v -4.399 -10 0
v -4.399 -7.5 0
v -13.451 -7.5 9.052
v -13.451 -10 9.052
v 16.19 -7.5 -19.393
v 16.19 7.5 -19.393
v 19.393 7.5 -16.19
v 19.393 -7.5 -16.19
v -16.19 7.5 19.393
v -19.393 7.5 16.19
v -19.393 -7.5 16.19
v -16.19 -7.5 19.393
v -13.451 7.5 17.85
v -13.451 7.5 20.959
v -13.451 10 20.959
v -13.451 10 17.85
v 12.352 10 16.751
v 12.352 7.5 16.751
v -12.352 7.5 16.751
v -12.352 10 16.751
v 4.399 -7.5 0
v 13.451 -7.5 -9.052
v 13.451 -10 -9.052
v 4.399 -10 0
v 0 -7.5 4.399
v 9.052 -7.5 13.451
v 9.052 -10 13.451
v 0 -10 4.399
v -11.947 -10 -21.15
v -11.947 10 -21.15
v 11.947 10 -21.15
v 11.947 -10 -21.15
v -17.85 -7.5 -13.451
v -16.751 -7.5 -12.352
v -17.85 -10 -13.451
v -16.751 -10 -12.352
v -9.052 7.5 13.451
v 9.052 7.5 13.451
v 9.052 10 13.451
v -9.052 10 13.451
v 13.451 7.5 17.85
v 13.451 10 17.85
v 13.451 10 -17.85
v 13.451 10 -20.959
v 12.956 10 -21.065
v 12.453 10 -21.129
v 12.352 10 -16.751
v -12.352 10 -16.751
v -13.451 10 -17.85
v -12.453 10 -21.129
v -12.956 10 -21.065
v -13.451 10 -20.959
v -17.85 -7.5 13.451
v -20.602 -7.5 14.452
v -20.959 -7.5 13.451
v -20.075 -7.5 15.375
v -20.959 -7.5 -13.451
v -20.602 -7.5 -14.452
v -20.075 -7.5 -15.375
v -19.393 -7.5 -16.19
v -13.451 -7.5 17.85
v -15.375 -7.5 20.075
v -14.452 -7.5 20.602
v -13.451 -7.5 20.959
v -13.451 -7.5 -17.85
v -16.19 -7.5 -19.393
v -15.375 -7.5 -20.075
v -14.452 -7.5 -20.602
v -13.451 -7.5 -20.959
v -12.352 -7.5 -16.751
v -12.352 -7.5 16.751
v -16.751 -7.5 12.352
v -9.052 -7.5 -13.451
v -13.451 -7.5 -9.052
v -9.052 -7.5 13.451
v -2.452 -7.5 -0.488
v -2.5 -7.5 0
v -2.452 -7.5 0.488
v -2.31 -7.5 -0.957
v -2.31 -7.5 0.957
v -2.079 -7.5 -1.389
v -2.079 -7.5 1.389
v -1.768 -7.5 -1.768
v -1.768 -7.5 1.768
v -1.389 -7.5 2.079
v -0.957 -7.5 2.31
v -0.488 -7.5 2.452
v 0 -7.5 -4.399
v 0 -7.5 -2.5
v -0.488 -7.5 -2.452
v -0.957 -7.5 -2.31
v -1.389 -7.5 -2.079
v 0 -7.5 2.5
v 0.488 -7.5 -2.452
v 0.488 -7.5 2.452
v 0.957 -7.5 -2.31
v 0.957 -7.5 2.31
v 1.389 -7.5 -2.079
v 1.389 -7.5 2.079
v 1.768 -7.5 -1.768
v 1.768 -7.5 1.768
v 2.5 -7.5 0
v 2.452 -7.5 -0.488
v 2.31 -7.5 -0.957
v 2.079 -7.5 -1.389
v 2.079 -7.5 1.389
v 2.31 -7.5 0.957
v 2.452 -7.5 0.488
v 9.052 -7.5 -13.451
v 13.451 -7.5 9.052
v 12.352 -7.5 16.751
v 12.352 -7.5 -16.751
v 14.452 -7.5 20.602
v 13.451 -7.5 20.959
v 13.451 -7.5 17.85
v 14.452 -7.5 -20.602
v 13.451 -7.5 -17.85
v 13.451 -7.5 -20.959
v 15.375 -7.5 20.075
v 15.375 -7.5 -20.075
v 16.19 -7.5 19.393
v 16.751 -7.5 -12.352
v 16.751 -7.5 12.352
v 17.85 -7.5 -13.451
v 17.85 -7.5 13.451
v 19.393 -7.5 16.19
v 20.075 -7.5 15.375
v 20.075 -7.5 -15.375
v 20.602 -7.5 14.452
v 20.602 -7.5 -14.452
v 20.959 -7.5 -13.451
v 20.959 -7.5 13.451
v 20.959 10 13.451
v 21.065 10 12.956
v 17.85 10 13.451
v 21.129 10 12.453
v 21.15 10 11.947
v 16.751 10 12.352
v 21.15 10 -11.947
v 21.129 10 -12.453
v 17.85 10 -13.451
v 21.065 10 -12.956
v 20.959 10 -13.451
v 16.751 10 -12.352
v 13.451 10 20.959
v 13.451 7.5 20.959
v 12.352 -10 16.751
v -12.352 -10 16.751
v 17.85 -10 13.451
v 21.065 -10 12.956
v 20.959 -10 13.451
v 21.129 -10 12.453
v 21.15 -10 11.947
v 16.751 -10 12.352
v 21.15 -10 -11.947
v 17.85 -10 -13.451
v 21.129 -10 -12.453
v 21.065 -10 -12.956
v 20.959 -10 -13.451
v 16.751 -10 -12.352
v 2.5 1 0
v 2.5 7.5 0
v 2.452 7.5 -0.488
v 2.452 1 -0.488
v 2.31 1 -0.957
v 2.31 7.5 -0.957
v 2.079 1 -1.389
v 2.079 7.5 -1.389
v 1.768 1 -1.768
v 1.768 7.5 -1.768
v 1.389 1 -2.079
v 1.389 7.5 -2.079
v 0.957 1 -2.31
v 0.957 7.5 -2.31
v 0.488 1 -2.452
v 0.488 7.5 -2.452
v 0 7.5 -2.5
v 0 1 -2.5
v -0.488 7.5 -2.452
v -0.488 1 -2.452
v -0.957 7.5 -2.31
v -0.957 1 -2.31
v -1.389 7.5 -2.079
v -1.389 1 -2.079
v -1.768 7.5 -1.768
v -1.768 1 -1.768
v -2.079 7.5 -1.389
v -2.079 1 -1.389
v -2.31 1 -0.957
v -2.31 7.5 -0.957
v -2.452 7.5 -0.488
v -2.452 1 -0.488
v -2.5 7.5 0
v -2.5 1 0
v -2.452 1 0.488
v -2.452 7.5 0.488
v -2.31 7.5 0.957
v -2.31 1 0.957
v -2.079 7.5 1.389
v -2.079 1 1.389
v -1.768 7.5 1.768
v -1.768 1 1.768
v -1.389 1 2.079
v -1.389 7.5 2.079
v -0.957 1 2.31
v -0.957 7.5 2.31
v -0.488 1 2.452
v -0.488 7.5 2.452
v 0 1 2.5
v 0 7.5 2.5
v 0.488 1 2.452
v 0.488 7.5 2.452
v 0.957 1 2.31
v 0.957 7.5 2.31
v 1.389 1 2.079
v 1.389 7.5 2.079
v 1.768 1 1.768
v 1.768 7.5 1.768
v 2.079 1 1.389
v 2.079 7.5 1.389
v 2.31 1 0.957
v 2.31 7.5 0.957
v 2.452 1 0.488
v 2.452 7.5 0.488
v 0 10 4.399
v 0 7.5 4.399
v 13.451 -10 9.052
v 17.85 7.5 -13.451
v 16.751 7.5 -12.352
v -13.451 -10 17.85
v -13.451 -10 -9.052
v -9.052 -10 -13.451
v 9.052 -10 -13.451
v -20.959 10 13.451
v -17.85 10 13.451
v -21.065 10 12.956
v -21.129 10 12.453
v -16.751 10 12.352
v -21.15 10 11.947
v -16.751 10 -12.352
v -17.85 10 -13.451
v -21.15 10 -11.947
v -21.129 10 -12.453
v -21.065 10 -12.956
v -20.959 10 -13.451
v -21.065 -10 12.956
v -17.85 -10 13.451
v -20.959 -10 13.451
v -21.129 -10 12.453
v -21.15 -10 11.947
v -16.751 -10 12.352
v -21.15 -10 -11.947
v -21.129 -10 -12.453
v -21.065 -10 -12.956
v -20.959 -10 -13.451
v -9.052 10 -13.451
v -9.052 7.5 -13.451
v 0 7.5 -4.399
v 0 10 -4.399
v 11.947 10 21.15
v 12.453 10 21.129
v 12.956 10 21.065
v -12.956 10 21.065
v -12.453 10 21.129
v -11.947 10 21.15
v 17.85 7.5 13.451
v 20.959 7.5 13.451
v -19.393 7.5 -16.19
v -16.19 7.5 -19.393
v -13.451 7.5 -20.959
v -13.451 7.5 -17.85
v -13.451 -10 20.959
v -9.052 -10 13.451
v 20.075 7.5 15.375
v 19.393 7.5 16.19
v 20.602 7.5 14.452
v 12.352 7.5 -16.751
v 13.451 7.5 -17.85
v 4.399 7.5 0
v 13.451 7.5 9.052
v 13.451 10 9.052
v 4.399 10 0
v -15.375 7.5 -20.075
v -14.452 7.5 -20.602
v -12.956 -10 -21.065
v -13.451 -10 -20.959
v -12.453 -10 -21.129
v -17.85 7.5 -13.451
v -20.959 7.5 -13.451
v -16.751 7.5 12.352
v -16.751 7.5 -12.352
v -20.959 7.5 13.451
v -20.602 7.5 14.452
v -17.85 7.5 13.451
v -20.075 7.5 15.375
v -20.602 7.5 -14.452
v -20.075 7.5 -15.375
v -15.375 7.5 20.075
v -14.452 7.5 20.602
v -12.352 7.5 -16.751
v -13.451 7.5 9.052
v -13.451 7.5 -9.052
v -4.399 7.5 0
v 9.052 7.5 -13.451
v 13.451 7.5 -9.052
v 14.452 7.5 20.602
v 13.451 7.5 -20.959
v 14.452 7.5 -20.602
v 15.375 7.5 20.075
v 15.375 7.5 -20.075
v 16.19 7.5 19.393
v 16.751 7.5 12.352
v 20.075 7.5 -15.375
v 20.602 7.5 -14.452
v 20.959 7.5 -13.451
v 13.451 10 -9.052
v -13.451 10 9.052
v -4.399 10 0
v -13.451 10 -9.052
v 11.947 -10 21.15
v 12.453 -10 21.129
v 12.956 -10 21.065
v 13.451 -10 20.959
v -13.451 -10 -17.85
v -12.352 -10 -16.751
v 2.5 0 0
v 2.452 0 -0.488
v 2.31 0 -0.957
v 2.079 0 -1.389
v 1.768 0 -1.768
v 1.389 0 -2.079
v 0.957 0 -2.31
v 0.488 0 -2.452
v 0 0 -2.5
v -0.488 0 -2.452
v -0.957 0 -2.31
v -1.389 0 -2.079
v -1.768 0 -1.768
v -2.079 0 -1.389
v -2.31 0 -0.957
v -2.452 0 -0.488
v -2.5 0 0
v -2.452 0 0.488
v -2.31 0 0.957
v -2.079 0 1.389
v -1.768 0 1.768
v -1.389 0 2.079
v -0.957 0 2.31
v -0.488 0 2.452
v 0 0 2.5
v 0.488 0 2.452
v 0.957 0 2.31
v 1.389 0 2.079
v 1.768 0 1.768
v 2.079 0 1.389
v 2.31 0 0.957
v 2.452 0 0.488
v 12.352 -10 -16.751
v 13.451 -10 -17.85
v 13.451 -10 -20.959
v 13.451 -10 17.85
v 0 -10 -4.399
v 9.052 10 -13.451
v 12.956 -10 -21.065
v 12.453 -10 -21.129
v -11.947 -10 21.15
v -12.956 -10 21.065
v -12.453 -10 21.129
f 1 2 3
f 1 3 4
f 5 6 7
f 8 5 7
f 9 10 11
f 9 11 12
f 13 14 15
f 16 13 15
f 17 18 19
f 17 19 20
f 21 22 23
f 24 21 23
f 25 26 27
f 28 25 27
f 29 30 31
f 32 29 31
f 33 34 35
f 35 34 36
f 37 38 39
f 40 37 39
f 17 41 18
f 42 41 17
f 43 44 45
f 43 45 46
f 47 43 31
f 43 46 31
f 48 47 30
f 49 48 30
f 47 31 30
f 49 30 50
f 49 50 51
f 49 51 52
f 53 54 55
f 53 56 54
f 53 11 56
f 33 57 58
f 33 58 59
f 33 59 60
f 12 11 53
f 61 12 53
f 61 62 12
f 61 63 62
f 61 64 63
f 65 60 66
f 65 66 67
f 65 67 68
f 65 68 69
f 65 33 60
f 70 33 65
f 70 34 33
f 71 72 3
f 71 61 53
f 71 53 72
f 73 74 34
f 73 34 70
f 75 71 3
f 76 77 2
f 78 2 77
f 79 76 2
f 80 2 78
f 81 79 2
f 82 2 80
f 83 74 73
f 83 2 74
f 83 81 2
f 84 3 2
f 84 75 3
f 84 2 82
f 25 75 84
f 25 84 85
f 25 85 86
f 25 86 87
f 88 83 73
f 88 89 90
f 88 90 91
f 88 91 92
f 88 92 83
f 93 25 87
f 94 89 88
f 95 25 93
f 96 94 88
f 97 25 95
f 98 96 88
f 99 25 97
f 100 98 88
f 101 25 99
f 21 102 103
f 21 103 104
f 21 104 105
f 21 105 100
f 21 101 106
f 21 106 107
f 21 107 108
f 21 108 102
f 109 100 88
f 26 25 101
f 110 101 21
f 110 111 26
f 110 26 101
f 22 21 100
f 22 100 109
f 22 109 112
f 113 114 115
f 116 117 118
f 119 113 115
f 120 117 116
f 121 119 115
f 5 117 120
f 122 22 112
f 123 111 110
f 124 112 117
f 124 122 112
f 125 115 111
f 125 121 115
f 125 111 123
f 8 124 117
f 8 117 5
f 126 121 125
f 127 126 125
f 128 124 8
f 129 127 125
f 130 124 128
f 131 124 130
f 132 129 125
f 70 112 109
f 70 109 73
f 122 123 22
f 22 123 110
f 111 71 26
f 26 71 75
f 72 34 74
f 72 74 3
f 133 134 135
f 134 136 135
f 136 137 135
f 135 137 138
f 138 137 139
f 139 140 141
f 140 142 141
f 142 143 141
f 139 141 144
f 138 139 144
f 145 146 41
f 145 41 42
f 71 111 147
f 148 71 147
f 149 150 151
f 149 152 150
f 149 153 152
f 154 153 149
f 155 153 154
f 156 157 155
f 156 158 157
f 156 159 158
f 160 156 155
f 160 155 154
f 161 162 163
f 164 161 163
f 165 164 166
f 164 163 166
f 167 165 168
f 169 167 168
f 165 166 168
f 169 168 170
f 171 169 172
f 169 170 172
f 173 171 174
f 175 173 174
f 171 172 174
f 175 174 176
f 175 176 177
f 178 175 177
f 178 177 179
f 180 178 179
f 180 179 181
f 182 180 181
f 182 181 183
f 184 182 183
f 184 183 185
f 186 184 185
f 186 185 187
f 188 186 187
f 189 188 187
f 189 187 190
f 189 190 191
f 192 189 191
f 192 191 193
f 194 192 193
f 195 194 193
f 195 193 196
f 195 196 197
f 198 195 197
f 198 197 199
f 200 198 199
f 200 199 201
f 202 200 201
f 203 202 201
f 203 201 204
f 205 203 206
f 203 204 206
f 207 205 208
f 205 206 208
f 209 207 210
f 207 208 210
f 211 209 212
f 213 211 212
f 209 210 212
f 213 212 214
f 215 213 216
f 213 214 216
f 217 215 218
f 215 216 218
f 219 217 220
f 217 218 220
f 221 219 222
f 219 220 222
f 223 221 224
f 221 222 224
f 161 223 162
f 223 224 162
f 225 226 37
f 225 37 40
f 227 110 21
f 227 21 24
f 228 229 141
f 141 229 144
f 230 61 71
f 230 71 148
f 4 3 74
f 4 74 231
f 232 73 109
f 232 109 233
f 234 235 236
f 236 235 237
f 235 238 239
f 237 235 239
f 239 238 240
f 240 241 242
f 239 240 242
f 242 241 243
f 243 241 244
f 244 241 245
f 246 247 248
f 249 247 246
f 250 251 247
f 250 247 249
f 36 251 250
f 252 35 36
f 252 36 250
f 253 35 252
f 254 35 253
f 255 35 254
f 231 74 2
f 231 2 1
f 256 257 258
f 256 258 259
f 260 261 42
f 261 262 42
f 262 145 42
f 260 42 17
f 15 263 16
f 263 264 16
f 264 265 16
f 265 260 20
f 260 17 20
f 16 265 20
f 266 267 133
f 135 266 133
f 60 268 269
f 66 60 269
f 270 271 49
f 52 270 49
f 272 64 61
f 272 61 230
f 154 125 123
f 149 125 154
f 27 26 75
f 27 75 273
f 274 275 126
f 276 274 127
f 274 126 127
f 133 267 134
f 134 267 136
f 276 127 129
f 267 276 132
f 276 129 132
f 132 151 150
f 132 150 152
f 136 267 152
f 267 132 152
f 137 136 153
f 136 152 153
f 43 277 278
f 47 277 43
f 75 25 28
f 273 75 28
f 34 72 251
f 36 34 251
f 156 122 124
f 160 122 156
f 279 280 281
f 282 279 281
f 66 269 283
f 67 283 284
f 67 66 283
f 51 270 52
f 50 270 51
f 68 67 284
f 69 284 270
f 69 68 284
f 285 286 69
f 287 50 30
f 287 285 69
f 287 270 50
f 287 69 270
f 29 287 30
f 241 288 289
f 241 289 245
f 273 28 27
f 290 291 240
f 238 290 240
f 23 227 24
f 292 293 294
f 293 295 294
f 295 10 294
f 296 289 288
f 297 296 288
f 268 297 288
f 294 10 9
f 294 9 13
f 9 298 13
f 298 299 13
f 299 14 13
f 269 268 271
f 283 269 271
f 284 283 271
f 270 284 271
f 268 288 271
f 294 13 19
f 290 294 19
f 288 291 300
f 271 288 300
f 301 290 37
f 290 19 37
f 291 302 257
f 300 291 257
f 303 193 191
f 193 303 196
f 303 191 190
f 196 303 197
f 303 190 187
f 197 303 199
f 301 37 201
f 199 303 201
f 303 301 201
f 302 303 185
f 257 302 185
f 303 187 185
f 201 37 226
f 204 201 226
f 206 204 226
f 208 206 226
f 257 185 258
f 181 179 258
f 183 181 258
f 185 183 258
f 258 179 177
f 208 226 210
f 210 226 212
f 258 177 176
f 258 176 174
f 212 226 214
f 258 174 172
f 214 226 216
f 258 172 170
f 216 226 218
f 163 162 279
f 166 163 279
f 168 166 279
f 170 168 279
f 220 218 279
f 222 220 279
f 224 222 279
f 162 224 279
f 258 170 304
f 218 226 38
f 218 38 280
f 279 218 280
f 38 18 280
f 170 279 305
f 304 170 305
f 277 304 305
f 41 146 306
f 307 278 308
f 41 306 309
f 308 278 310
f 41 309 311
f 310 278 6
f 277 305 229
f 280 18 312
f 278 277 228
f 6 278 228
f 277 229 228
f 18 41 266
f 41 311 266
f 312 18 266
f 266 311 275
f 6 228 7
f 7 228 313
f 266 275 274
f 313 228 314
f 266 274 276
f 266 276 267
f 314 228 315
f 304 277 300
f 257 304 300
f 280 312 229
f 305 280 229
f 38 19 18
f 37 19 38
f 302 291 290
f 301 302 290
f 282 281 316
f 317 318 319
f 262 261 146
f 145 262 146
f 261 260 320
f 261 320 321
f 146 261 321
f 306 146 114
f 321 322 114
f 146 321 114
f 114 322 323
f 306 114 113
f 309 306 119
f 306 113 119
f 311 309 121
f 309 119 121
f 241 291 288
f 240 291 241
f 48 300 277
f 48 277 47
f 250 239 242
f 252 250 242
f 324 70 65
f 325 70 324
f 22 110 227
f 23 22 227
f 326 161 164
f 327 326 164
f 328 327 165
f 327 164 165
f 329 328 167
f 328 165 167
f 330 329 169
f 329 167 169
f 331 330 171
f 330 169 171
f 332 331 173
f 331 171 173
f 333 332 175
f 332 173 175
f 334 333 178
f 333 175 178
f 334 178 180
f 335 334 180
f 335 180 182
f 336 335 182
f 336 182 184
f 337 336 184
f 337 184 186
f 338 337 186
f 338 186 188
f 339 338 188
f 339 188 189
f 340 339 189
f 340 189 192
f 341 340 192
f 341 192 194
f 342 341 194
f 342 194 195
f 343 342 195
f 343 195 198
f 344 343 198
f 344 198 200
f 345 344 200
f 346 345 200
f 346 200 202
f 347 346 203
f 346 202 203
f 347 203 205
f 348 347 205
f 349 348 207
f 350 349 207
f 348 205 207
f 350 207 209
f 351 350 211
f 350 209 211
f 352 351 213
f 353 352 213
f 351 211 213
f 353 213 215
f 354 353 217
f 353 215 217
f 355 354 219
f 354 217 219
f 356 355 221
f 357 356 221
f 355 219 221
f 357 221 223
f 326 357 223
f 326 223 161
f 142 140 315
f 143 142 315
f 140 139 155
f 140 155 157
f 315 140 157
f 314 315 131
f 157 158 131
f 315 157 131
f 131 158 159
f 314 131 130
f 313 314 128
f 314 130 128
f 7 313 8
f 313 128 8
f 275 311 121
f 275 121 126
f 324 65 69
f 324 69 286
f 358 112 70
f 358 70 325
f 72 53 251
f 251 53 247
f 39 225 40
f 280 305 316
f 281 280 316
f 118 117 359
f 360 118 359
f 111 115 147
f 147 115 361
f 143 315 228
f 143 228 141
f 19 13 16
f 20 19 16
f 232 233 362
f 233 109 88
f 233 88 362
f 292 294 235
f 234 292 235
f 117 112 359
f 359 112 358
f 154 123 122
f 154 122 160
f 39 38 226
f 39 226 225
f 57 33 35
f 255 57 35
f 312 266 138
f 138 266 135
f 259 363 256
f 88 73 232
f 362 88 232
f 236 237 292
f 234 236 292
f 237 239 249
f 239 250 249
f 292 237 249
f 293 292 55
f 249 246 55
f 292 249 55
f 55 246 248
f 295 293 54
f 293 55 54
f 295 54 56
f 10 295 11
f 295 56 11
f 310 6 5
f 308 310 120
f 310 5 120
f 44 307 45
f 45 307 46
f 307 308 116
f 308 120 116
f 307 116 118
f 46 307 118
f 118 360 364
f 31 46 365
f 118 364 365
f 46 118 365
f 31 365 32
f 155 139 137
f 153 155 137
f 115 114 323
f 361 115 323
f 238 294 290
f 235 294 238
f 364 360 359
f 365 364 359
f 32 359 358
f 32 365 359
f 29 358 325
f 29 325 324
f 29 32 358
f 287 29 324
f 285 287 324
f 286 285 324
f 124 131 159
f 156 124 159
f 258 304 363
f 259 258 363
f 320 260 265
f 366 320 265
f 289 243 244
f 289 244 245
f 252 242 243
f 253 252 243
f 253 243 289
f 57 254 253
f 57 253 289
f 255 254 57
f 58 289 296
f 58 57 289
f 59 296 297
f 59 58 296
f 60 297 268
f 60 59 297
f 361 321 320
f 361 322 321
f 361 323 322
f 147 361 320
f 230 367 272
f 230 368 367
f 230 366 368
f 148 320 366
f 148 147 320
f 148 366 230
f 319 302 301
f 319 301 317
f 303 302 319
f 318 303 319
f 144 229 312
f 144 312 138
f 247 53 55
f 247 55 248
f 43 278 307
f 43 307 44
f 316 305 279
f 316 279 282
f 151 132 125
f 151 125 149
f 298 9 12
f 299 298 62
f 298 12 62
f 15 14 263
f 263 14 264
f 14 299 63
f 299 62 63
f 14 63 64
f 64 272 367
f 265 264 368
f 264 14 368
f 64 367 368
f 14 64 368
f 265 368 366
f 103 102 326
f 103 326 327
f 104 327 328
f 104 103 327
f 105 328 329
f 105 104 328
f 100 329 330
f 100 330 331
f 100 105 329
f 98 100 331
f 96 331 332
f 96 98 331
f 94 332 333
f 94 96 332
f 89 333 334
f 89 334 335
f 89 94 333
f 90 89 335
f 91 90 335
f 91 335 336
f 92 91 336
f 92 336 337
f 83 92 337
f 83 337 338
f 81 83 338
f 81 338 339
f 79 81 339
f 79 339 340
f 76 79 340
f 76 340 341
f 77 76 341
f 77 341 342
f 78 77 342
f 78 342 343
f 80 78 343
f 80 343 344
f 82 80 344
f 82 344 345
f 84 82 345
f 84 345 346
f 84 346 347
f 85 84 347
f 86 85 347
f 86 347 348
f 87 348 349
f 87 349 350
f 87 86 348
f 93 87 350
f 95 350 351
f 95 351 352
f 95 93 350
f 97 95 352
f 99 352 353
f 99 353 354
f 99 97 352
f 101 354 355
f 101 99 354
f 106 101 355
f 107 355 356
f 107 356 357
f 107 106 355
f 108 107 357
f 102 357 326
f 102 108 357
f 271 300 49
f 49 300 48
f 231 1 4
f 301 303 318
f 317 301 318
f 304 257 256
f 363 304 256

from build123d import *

# Parameters (mm, degrees)
BOSS_EXTRUDE1_DEPTH = 10
SKETCH18_W          = 3.3
SKETCH18_H          = 2.5
CUT_EXTRUDE10_DEPTH = 43.3
SKETCH19_W          = 3.3
SKETCH19_H          = 2.5
CUT_EXTRUDE11_DEPTH = 43.3
SKETCH20_W          = 6.221233688
SKETCH20_H          = 2.5
CUT_EXTRUDE12_DEPTH = 57.710616844
SKETCH21_W          = 6.221233688
SKETCH21_H          = 2.5
CUT_EXTRUDE13_DEPTH = 57.710616844
SKETCH22_R          = 2.5
CUT_EXTRUDE14_DEPTH = 8.5
CUT_EXTRUDE15_DEPTH = 18.5
FILLET8_R           = 6


with BuildPart() as part:
    # Sketch1 → Boss-Extrude1 (new body)
    with BuildSketch(Plane(origin=(0, 0, 0), x_dir=(1, 0, 0), z_dir=(0, 1, 0))):
        Polygon((-21.15, 16.750923472), (-16.750923472, 21.15), (16.750923472, 21.15), (21.15, 16.750923472), (21.15, -16.750923472), (16.750923472, -21.15), (-16.750923472, -21.15), (-21.15, -16.750923472), align=None)
    boss_extrude1 = extrude(amount=BOSS_EXTRUDE1_DEPTH)

    # Sketch18 → Cut-Extrude10 (cut, through all)
    with BuildSketch(Plane.XY.offset(21.15)):
        with Locations((15.100923472, 8.75)):
            Rectangle(SKETCH18_W, SKETCH18_H)
        with Locations((-15.100923472, 8.75)):
            Rectangle(SKETCH18_W, SKETCH18_H)
    cut_extrude10 = extrude(amount=-CUT_EXTRUDE10_DEPTH, mode=Mode.SUBTRACT)

    # Sketch19 → Cut-Extrude11 (cut, through all)
    with BuildSketch(Plane(origin=(21.15, 0, 0), x_dir=(0, 0, -1), z_dir=(1, 0, 0))):
        with Locations((-15.100923472, 8.75)):
            Rectangle(SKETCH19_W, SKETCH19_H)
        with Locations((15.100923472, 8.75)):
            Rectangle(SKETCH19_W, SKETCH19_H)
    cut_extrude11 = extrude(amount=-CUT_EXTRUDE11_DEPTH, mode=Mode.SUBTRACT)

    # Sketch20 → Cut-Extrude12 (cut, through all)
    with BuildSketch(Plane(origin=(18.950461736, 0, 18.950461736), x_dir=(0.707106781, 0, -0.707106781), z_dir=(0.707106781, 0, 0.707106781))):
        with Locations((0, 8.75)):
            Rectangle(SKETCH20_W, SKETCH20_H)
    cut_extrude12 = extrude(amount=-CUT_EXTRUDE12_DEPTH, mode=Mode.SUBTRACT)

    # Sketch21 → Cut-Extrude13 (cut, through all)
    with BuildSketch(Plane(origin=(-18.950461736, 0, 18.950461736), x_dir=(0.707106781, 0, 0.707106781), z_dir=(-0.707106781, 0, 0.707106781))):
        with Locations((0, 8.75)):
            Rectangle(SKETCH21_W, SKETCH21_H)
    cut_extrude13 = extrude(amount=-CUT_EXTRUDE13_DEPTH, mode=Mode.SUBTRACT)

    # Sketch22 → Cut-Extrude14 (cut, through all)
    with BuildSketch(Plane(origin=(0, 7.5, 0), x_dir=(1, 0, 0), z_dir=(0, 1, 0))):
        Circle(SKETCH22_R)
    cut_extrude14 = extrude(amount=-CUT_EXTRUDE14_DEPTH, mode=Mode.SUBTRACT)

    # Mirror1: Boss-Extrude1, Cut-Extrude10, Cut-Extrude11, Cut-Extrude12, Cut-Extrude13, Cut-Extrude14 across plane
    add(boss_extrude1.mirror(Plane(origin=(0, 0, 0), x_dir=(0, 0, 1), z_dir=(0, -1, 0))))
    add(cut_extrude10.mirror(Plane(origin=(0, 0, 0), x_dir=(0, 0, 1), z_dir=(0, -1, 0))), mode=Mode.SUBTRACT)
    add(cut_extrude11.mirror(Plane(origin=(0, 0, 0), x_dir=(0, 0, 1), z_dir=(0, -1, 0))), mode=Mode.SUBTRACT)
    add(cut_extrude12.mirror(Plane(origin=(0, 0, 0), x_dir=(0, 0, 1), z_dir=(0, -1, 0))), mode=Mode.SUBTRACT)
    add(cut_extrude13.mirror(Plane(origin=(0, 0, 0), x_dir=(0, 0, 1), z_dir=(0, -1, 0))), mode=Mode.SUBTRACT)
    add(cut_extrude14.mirror(Plane(origin=(0, 0, 0), x_dir=(0, 0, 1), z_dir=(0, -1, 0))), mode=Mode.SUBTRACT)

    # Sketch23 → Cut-Extrude15 (cut, through all)
    with BuildSketch(Plane(origin=(0, 7.5, 0), x_dir=(1, 0, 0), z_dir=(0, 1, 0))):
        Polygon((-21.15, -14.432485579), (-14.432485579, -21.15), (-16.750923472, -21.15), (-21.15, -16.750923472), align=None)
        Polygon((-21.15, 14.432485579), (-14.432485579, 21.15), (-16.750923472, 21.15), (-21.15, 16.750923472), align=None)
        Polygon((14.432485579, 21.15), (21.15, 14.432485579), (21.15, 16.750923472), (16.750923472, 21.15), align=None)
        Polygon((14.432485579, -21.15), (21.15, -14.432485579), (21.15, -16.750923472), (16.750923472, -21.15), align=None)
    extrude(amount=-CUT_EXTRUDE15_DEPTH, mode=Mode.SUBTRACT)

    # Fillet8
    fillet8_edges = [part.edges().sort_by_distance(p)[0] for p in [
        (14.432485579, 0, -21.15),
        (21.15, 0, -14.432485579),
        (-21.15, 0, -14.432485579),
        (-14.432485579, 0, -21.15),
        (-14.432485579, 0, 21.15),
        (-21.15, 0, 14.432485579),
        (21.15, 0, 14.432485579),
        (14.432485579, 0, 21.15),
    ]]
    fillet(fillet8_edges, radius=FILLET8_R)


solid = part.part
